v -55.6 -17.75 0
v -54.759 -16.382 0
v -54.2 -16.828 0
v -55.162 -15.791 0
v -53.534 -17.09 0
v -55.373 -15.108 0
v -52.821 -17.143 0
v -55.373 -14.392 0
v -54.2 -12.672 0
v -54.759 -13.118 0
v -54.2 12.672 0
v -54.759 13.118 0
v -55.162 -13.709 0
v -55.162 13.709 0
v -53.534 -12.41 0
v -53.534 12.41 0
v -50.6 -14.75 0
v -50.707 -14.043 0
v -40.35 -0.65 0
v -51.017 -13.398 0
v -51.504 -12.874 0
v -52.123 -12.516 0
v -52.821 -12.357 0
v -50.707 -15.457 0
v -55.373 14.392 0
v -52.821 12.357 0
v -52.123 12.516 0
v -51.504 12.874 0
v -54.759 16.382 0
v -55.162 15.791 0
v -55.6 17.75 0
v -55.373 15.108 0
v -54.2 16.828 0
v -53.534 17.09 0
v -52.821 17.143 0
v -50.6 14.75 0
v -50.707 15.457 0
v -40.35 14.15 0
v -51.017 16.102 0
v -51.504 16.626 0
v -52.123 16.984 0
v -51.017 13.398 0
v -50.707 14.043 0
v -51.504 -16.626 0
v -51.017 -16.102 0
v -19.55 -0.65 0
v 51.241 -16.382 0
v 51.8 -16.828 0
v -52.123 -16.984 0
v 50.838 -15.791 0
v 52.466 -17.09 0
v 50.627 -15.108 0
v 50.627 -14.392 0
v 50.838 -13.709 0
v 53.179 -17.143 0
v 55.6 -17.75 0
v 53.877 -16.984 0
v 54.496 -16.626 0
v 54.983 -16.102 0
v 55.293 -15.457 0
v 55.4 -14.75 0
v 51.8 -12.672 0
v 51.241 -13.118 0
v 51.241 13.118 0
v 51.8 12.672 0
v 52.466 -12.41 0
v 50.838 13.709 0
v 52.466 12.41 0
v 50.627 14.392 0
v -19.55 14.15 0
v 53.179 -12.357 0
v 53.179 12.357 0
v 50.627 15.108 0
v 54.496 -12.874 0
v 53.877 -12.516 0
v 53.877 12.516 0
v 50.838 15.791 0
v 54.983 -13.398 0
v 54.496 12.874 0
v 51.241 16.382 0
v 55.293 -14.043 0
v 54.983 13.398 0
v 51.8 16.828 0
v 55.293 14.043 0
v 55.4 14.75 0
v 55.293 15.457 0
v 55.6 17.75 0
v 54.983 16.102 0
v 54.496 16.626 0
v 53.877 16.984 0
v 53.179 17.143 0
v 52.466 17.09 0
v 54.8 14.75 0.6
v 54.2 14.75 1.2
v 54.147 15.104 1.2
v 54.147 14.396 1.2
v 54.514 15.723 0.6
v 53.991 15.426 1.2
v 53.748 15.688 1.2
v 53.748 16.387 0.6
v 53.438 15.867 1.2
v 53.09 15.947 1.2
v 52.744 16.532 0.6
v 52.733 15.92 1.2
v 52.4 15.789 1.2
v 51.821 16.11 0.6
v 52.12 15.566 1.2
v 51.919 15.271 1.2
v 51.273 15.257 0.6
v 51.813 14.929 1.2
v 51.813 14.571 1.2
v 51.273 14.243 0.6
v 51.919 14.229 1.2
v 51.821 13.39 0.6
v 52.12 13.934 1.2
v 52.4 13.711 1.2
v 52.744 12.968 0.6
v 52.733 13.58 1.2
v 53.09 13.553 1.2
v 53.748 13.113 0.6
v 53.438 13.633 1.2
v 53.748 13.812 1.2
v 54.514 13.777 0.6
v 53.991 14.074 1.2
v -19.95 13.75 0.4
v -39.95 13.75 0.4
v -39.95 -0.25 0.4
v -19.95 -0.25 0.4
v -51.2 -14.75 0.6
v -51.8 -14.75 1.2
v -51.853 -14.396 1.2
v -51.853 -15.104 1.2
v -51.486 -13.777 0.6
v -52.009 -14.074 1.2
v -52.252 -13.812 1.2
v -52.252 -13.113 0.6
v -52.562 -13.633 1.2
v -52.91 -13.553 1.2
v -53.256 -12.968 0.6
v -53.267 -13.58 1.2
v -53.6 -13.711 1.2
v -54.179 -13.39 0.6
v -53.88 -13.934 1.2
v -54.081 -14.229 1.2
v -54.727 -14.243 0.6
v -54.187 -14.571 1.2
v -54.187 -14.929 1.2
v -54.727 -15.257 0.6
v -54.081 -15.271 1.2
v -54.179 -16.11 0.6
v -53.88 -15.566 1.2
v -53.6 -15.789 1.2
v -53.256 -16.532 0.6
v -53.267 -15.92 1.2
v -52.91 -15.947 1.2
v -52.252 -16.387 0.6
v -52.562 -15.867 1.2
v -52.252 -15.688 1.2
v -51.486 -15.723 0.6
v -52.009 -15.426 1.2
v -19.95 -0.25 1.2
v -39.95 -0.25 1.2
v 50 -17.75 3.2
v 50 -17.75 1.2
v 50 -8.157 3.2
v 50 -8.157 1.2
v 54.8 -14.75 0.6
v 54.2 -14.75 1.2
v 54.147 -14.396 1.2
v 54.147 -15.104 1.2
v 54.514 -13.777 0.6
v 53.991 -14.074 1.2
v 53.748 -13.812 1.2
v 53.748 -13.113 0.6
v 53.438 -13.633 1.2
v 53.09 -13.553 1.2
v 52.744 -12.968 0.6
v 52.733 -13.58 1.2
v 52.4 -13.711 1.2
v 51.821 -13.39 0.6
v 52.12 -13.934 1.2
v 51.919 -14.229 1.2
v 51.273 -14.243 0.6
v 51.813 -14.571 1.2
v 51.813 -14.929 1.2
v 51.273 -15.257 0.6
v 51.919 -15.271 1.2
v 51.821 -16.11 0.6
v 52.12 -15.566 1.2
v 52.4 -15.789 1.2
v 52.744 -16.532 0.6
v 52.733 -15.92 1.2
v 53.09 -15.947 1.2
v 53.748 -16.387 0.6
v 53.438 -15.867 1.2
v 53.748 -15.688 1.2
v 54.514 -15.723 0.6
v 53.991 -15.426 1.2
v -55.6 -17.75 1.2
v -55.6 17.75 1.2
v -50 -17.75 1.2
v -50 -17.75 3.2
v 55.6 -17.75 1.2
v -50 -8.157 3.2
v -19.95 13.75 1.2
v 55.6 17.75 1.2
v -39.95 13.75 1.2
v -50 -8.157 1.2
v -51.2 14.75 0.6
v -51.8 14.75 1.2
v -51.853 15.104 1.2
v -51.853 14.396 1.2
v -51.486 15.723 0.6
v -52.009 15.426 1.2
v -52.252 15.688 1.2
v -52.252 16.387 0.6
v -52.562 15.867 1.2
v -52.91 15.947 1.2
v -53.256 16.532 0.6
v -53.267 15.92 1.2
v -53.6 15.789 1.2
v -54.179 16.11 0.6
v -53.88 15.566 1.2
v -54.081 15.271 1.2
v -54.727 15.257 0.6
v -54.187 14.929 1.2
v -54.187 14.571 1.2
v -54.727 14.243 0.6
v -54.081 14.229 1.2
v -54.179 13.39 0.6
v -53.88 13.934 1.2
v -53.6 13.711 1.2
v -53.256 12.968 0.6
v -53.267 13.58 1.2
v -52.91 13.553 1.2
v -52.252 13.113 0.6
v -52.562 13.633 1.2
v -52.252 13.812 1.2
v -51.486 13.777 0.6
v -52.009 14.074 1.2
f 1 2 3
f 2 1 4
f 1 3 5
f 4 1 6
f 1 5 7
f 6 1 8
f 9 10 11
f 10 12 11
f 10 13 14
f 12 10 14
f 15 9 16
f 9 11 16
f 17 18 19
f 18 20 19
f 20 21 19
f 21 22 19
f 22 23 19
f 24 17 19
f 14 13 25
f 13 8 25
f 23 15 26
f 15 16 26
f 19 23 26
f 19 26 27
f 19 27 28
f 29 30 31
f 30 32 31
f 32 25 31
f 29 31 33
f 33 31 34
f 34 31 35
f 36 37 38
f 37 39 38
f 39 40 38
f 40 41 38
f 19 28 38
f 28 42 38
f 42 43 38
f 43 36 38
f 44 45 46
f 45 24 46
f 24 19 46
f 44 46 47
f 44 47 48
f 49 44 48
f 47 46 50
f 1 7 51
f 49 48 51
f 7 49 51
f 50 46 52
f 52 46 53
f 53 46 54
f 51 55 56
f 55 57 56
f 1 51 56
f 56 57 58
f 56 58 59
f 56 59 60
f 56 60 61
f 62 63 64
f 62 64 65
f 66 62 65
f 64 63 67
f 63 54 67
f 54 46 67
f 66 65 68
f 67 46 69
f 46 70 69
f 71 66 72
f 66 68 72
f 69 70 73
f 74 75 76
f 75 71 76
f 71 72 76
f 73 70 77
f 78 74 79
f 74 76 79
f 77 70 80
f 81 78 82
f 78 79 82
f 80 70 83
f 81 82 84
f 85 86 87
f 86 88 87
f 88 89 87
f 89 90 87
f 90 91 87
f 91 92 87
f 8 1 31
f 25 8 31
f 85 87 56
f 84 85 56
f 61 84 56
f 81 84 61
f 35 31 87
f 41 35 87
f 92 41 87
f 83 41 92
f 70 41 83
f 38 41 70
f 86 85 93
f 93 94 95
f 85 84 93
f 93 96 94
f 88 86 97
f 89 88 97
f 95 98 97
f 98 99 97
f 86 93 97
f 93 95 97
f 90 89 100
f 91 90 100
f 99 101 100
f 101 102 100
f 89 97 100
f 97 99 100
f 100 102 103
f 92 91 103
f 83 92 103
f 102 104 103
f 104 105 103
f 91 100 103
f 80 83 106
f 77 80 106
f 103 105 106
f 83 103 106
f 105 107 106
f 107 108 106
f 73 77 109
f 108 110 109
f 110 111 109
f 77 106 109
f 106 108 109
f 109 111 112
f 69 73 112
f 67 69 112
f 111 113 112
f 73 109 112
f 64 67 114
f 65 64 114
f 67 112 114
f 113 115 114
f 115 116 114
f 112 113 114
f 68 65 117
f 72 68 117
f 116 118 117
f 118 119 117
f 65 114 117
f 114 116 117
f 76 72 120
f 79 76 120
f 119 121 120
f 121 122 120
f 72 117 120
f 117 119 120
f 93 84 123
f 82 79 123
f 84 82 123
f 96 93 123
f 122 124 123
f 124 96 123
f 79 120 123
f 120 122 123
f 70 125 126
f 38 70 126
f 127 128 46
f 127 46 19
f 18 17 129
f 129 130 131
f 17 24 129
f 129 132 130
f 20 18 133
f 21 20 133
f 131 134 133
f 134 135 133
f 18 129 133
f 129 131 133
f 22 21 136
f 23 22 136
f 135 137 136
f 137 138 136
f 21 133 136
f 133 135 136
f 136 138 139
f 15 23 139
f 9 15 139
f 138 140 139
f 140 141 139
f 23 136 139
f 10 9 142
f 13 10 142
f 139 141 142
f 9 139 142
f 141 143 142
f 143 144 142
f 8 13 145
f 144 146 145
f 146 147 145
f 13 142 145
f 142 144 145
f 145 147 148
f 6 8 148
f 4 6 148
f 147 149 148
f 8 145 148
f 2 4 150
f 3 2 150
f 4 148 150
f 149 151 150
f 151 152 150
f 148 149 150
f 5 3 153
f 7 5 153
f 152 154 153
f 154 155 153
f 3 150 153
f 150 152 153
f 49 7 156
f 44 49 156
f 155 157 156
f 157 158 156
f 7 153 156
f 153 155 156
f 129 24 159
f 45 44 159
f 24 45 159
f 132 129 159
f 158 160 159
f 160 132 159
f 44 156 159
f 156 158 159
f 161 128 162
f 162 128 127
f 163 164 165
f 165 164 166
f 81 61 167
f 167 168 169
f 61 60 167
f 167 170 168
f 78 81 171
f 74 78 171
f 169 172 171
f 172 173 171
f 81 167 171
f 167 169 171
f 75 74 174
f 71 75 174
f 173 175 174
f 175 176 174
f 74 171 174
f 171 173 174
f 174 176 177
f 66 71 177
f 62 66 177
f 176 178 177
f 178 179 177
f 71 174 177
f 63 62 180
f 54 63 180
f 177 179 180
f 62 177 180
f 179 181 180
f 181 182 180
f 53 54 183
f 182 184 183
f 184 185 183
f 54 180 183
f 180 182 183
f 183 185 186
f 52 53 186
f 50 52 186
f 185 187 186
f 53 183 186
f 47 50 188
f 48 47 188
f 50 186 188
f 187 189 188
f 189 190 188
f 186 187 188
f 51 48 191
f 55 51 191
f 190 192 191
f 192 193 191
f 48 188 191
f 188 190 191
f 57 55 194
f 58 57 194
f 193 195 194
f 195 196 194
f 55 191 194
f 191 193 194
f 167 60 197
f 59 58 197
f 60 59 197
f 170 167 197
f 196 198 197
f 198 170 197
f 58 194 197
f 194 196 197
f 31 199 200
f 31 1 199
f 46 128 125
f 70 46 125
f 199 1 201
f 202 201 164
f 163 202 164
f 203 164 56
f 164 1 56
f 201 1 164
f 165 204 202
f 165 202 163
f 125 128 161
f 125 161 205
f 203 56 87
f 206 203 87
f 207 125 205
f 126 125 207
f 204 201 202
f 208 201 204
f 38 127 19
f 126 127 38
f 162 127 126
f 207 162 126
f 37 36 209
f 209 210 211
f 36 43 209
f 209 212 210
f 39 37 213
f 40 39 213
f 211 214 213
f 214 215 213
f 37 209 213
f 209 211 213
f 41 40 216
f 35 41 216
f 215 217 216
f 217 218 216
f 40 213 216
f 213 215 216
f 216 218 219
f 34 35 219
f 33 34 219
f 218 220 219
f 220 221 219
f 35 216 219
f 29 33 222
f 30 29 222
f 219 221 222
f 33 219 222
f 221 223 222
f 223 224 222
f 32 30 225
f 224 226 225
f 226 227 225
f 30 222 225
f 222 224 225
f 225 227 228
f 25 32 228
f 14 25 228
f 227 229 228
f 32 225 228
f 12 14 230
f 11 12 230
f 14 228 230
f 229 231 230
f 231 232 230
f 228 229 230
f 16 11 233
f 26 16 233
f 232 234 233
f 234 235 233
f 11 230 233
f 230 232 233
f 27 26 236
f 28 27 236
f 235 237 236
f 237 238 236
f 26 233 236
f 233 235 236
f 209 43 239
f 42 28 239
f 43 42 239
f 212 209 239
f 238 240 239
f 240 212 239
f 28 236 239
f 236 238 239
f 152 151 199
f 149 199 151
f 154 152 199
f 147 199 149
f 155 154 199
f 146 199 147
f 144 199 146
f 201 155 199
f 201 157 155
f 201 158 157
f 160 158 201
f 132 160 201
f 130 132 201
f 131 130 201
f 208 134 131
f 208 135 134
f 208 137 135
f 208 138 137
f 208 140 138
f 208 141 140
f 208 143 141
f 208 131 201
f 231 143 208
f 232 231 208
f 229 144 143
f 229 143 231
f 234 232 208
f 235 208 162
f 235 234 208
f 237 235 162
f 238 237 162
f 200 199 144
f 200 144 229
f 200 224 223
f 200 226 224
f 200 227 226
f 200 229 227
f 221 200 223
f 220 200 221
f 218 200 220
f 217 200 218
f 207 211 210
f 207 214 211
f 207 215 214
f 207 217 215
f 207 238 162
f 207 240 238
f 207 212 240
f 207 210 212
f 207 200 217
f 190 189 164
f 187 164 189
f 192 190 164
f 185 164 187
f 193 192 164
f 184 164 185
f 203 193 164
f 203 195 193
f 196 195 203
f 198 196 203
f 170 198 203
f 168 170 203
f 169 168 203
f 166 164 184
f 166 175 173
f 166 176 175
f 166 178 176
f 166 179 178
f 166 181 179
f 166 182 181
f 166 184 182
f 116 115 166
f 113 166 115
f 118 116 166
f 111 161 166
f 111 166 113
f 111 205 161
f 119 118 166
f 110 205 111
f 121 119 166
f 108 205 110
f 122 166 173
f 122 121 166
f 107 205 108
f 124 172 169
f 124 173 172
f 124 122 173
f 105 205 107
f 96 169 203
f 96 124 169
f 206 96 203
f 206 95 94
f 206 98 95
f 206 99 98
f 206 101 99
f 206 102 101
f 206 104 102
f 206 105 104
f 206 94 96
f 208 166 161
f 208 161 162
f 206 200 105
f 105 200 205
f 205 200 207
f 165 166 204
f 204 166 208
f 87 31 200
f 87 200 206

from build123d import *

# Parameters (mm, degrees)
SKETCH1_W                       = 112
SKETCH1_H                       = 35.5
BOSS_EXTRUDE1_DEPTH             = 1.2
SKETCH2_W                       = 6
SKETCH2_H                       = 6
BOSS_EXTRUDE2_DEPTH             = 2
SKETCH3_R                       = 1.1
CUT_EXTRUDE1_DEPTH              = 59.83283522
SKETCH5_W                       = 20
SKETCH5_H                       = 14
CUT_EXTRUDE3_DEPTH              = 59.83283522
CHAMFER1_SIZE                   = 0.4
CUT_EXTRUDE6_DEPTH              = 59.779779687
CUT_EXTRUDE6_DEPTH_BACK         = 59.779779687
SKETCH8_W                       = 0.4
SKETCH8_H                       = 35.5
SKIZZE1_W                       = 5.6
SKIZZE1_H                       = 23.5
AUFSATZ_LINEAR_AUSTRAGEN1_DEPTH = 2
SKETCH9_W                       = 5.6
SKETCH9_H                       = 35.5
CUT_EXTRUDE7_DEPTH              = 2
CHAMFER2_SIZE                   = 1.3


with BuildPart() as part:
    # Sketch1 → Boss-Extrude1 (new body)
    with BuildSketch(Plane.XY):
        Rectangle(SKETCH1_W, SKETCH1_H)
    extrude(amount=BOSS_EXTRUDE1_DEPTH)

    # Sketch2 → Boss-Extrude2 (add)
    with BuildSketch(Plane.XY.offset(1.2)):
        with Locations((-53, 14.75)):
            Rectangle(SKETCH2_W, SKETCH2_H)
        with Locations((-53, -14.75)):
            Rectangle(SKETCH2_W, SKETCH2_H)
        with Locations((53, -14.75)):
            Rectangle(SKETCH2_W, SKETCH2_H)
        with Locations((53, 14.75)):
            Rectangle(SKETCH2_W, SKETCH2_H)
    extrude(amount=BOSS_EXTRUDE2_DEPTH)

    # Sketch3 → Cut-Extrude1 (cut, through all)
    with BuildSketch(Plane.XY.offset(3.2)):
        with Locations((-53, 14.75)):
            Circle(SKETCH3_R)
        with Locations((-53, -14.75)):
            Circle(SKETCH3_R)
        with Locations((53, -14.75)):
            Circle(SKETCH3_R)
        with Locations((53, 14.75)):
            Circle(SKETCH3_R)
    extrude(amount=-CUT_EXTRUDE1_DEPTH, mode=Mode.SUBTRACT)

    # Sketch5 → Cut-Extrude3 (cut, through all)
    with BuildSketch(Plane(origin=(0, 0, 0), x_dir=(-1, 0, 0), z_dir=(0, 0, -1))):
        with Locations((29.95, 6.75)):
            Rectangle(SKETCH5_W, SKETCH5_H)
    extrude(amount=-CUT_EXTRUDE3_DEPTH, mode=Mode.SUBTRACT)

    # Chamfer1
    chamfer1_edges = [part.edges().sort_by_distance(p)[0] for p in [
        (-39.95, 6.75, 0),
        (-29.95, 13.75, 0),
        (-19.95, 6.75, 0),
        (-29.95, -0.25, 0),
    ]]
    chamfer(chamfer1_edges, length=CHAMFER1_SIZE)

    # Sketch8 → Cut-Extrude6 (cut, two sides: drawn at the far end of the back side and taken through both)
    with BuildSketch(Plane.XY.offset(1.2).offset(-CUT_EXTRUDE6_DEPTH_BACK)):
        with Locations((-55.8, 0)):
            Rectangle(SKETCH8_W, SKETCH8_H)
        with Locations((55.8, 0)):
            Rectangle(SKETCH8_W, SKETCH8_H)
    extrude(amount=CUT_EXTRUDE6_DEPTH + CUT_EXTRUDE6_DEPTH_BACK, mode=Mode.SUBTRACT)

    # Skizze1 → Aufsatz-Linear austragen1 (add)
    with BuildSketch(Plane.XY.offset(1.2)):
        Polygon((50, -8.156810447), (-50, -8.156810447), (-50, -11.75), (-50, -17.75), (50, -17.75), (50, -11.75), align=None)
        with Locations((-52.8, 0)):
            Rectangle(SKIZZE1_W, SKIZZE1_H)
        with Locations((52.8, 0)):
            Rectangle(SKIZZE1_W, SKIZZE1_H)
    extrude(amount=AUFSATZ_LINEAR_AUSTRAGEN1_DEPTH)

    # Sketch9 → Cut-Extrude7 (cut)
    with BuildSketch(Plane.XY.offset(1.2)):
        with Locations((-52.8, 0)):
            Rectangle(SKETCH9_W, SKETCH9_H)
        with Locations((52.8, 0)):
            Rectangle(SKETCH9_W, SKETCH9_H)
    extrude(amount=CUT_EXTRUDE7_DEPTH, mode=Mode.SUBTRACT)

    # Chamfer2
    # the kernel refuses this chamfer: 1.3 mm, written as the material it takes off along each edge
    with BuildSketch(Plane(origin=(-53, 14.75, 0), x_dir=(1, 0, 0), z_dir=(0, -1, 0))) as chamfer2_piece_1:
        Polygon((1.1 + CHAMFER2_SIZE, 0), (1.1, CHAMFER2_SIZE), (1.1, 0), align=None)
    revolve(axis=Axis((-53, 14.75, 0), (0, 0, 1)), mode=Mode.SUBTRACT)
    with BuildSketch(Plane(origin=(-53, -14.75, 0), x_dir=(1, 0, 0), z_dir=(0, -1, 0))) as chamfer2_piece_2:
        Polygon((1.1 + CHAMFER2_SIZE, 0), (1.1, CHAMFER2_SIZE), (1.1, 0), align=None)
    revolve(axis=Axis((-53, -14.75, 0), (0, 0, 1)), mode=Mode.SUBTRACT)
    with BuildSketch(Plane(origin=(53, -14.75, 0), x_dir=(1, 0, 0), z_dir=(0, -1, 0))) as chamfer2_piece_3:
        Polygon((1.1 + CHAMFER2_SIZE, 0), (1.1, CHAMFER2_SIZE), (1.1, 0), align=None)
    revolve(axis=Axis((53, -14.75, 0), (0, 0, 1)), mode=Mode.SUBTRACT)
    with BuildSketch(Plane(origin=(53, 14.75, 0), x_dir=(1, 0, 0), z_dir=(0, -1, 0))) as chamfer2_piece_4:
        Polygon((1.1 + CHAMFER2_SIZE, 0), (1.1, CHAMFER2_SIZE), (1.1, 0), align=None)
    revolve(axis=Axis((53, 14.75, 0), (0, 0, 1)), mode=Mode.SUBTRACT)


solid = part.part
